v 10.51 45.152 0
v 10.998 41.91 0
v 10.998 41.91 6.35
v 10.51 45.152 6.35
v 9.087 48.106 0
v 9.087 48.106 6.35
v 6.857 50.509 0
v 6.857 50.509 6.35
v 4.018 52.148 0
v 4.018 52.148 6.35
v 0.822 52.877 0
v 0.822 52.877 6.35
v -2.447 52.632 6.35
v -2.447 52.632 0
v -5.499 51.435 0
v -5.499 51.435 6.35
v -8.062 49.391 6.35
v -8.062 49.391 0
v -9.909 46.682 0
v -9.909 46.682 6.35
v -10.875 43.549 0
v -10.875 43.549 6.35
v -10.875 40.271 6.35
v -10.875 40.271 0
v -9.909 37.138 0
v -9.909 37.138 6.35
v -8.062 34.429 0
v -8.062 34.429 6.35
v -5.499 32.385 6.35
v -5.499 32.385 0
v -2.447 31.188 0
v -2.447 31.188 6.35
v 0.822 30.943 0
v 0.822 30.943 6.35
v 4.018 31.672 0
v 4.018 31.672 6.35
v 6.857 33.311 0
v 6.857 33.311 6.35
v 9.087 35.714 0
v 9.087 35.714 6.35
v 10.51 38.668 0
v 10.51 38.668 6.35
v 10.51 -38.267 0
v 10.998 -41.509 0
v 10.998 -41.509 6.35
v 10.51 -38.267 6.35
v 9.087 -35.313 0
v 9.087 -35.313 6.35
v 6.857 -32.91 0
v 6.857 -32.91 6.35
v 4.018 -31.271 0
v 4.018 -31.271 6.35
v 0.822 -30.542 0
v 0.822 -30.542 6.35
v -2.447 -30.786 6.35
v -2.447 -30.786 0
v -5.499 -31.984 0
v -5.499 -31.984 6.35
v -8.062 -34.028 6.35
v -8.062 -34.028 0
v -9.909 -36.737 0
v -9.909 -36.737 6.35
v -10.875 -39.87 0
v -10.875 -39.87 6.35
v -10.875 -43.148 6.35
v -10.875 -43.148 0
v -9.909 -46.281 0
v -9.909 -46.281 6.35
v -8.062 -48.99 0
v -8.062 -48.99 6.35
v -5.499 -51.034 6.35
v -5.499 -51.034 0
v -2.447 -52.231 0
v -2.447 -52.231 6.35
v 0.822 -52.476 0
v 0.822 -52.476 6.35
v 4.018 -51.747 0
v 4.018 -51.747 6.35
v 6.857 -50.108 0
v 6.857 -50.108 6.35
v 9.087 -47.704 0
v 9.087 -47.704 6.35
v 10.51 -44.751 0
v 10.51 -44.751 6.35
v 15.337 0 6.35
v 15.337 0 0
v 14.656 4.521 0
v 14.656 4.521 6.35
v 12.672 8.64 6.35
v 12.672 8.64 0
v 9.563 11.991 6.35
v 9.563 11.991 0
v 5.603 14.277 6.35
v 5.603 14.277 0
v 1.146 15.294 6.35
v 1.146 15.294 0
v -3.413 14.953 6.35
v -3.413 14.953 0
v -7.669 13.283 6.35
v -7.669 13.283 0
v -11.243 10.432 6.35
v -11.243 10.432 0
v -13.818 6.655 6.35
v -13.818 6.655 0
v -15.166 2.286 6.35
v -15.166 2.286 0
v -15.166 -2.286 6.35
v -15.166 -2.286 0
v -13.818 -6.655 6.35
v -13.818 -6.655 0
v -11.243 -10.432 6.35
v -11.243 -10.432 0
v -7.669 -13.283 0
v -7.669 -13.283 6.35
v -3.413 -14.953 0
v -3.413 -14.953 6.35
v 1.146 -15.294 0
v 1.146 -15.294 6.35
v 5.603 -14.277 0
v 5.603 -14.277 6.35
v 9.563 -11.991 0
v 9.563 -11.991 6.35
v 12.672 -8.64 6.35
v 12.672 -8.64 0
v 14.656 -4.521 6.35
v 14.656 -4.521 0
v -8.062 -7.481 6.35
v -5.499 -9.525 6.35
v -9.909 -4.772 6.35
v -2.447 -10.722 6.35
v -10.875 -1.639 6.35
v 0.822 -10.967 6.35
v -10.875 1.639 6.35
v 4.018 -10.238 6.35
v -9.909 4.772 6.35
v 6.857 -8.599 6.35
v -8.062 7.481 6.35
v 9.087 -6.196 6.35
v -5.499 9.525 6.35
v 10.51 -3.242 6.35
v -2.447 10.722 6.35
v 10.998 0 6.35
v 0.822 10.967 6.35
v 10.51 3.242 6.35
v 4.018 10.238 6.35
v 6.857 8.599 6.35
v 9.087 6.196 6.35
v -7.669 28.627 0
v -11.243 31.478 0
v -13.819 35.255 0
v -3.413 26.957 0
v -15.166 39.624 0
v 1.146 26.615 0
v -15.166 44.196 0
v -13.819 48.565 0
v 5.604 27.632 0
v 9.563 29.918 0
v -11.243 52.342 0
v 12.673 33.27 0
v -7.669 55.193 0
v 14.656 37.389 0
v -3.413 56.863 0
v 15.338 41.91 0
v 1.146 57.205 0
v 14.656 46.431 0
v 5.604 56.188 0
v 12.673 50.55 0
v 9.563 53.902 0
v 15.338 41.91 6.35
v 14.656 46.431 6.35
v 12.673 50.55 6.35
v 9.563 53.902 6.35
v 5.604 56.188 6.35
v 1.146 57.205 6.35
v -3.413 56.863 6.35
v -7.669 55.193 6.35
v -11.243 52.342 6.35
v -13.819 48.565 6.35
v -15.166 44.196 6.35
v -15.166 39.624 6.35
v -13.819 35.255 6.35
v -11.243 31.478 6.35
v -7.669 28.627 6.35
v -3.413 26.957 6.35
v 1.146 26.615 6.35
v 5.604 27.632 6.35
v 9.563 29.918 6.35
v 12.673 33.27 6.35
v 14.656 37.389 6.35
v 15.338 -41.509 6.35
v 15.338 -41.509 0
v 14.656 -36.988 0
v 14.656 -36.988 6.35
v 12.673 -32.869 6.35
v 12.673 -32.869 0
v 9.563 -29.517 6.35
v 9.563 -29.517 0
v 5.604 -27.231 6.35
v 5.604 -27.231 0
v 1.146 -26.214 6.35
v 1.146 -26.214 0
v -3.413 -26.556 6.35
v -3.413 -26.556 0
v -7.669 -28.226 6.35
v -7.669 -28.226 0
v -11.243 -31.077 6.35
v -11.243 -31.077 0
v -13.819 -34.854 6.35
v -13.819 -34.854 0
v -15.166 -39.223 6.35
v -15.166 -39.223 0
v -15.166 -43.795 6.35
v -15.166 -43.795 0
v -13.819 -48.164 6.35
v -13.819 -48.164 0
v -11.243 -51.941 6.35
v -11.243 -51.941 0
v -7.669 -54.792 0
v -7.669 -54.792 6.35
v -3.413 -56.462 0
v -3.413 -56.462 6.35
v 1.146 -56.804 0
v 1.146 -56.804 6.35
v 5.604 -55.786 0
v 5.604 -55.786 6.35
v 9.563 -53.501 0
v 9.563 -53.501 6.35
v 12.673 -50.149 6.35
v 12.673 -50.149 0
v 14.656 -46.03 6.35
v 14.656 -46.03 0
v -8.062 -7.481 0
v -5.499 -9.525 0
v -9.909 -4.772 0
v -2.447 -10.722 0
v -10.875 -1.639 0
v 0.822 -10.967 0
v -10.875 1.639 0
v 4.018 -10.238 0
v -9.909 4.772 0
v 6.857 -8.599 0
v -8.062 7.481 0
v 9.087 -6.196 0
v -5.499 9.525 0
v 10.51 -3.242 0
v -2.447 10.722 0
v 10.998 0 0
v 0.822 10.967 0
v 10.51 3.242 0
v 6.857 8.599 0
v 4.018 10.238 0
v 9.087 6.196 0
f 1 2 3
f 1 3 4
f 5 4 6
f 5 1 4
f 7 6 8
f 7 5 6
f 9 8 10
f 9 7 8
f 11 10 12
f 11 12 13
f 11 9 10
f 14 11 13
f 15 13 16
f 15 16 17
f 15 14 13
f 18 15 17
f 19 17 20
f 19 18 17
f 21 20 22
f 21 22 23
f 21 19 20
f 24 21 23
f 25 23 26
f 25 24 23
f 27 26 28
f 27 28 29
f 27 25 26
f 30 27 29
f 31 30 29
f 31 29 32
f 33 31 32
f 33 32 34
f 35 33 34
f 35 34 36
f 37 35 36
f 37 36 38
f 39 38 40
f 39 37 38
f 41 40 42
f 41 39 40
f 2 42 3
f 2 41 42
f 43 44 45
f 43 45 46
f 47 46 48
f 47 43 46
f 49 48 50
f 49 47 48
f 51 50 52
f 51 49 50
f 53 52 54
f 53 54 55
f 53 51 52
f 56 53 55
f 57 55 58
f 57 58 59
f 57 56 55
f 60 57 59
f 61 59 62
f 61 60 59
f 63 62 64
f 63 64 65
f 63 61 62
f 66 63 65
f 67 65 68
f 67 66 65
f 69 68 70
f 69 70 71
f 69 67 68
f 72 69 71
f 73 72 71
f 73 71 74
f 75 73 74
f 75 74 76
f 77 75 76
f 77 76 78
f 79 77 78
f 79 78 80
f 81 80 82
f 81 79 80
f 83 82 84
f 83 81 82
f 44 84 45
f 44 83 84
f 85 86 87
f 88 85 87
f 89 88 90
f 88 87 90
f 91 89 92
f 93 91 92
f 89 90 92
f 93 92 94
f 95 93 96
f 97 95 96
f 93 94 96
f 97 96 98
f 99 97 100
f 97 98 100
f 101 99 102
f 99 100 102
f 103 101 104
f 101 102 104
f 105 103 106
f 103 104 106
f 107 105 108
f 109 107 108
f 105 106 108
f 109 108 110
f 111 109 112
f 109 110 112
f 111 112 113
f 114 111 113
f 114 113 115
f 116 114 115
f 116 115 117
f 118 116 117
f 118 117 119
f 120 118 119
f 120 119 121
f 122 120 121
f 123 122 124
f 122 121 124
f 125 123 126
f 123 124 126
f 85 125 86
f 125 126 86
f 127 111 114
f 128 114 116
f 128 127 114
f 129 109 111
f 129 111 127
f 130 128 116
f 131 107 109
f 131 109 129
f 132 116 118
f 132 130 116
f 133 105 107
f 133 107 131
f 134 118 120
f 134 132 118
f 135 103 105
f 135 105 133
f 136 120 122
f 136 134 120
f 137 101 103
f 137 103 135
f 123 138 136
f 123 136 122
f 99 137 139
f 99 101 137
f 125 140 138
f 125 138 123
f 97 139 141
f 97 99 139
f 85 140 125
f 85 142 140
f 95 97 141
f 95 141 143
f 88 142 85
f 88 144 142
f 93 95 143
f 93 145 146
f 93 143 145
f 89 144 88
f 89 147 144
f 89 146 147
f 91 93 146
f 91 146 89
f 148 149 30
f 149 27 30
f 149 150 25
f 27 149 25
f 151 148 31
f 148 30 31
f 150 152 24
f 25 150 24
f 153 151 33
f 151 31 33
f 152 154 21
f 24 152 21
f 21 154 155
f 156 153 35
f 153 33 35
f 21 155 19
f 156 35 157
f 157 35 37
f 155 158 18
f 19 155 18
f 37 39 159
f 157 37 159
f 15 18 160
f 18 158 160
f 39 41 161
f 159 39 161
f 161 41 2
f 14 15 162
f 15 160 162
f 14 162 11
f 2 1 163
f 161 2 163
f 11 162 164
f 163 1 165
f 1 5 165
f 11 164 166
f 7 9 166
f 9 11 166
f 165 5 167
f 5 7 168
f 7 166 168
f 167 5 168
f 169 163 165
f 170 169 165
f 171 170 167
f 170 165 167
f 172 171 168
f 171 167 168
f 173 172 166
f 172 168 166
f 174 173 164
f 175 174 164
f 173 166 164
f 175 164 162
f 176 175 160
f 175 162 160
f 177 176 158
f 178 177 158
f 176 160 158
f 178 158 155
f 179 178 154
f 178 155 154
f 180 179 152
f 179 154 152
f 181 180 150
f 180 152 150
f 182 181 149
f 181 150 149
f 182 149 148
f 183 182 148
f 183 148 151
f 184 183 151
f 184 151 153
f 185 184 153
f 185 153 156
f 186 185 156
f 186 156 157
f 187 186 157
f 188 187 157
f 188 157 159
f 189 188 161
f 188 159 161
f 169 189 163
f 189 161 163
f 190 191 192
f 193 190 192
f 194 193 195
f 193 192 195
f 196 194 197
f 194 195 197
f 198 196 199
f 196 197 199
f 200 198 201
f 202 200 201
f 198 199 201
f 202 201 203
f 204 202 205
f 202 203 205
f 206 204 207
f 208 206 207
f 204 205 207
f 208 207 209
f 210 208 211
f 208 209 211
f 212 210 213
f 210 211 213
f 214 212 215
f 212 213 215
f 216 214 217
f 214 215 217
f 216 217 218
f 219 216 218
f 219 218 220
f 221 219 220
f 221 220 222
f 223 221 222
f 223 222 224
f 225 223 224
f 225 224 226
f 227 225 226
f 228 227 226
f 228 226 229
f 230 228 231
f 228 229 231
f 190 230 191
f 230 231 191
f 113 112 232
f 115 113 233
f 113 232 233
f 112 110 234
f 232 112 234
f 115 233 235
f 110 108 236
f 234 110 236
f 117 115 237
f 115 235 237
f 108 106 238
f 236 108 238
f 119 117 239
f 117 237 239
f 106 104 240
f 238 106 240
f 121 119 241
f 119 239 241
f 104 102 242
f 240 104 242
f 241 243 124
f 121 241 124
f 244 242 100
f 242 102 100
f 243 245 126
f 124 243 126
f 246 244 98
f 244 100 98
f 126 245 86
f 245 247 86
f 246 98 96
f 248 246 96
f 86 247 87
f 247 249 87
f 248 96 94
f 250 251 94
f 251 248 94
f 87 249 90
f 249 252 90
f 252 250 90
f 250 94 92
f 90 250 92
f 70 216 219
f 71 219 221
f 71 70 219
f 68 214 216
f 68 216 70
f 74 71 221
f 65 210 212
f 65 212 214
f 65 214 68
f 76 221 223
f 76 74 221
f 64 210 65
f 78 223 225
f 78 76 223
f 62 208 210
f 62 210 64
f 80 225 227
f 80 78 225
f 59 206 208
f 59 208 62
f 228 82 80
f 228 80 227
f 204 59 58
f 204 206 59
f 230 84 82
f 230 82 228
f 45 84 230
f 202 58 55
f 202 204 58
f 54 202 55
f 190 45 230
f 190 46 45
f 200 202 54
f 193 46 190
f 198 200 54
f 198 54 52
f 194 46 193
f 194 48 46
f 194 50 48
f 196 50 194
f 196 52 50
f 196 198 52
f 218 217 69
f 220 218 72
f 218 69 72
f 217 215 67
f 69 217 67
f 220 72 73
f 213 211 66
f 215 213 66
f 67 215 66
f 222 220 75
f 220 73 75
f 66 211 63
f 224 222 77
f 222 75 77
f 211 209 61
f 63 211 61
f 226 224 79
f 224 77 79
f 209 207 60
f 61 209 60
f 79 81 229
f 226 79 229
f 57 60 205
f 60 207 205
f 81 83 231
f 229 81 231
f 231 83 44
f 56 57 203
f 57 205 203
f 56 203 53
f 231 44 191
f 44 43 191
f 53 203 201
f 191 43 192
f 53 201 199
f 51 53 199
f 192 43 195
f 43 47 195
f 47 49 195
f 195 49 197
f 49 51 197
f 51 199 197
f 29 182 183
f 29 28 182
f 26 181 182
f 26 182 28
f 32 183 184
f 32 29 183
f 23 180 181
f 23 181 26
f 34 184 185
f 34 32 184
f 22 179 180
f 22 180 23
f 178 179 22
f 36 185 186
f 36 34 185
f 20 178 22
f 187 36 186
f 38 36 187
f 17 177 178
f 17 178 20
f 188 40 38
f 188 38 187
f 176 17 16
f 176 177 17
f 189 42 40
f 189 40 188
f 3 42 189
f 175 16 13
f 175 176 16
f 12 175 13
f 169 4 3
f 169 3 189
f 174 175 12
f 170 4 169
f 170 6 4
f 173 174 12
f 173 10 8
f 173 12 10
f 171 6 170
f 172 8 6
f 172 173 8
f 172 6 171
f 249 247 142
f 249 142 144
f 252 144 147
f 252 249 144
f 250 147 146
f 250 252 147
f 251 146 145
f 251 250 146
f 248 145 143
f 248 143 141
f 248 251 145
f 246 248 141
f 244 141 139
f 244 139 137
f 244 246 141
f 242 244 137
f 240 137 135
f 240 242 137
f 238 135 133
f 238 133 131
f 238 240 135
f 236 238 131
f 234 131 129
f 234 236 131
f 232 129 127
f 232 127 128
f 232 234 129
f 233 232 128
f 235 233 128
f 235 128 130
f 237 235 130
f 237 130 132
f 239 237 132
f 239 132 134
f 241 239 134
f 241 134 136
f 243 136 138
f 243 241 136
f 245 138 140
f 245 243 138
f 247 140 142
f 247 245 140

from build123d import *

# Parameters (mm, degrees)
F1_R     = 15.337315
F1_R_2   = 10.9982
F2_R     = 15.33779
F2_R_2   = 10.9982
F3_DEPTH = 6.35


with BuildPart() as f3:
    # F1 (on face) + F2 (on Top) → F3 (new body)
    with BuildSketch(Plane.XY):
        Circle(F1_R)
        Circle(F1_R_2, mode=Mode.SUBTRACT)
    with BuildSketch(Plane.XY):
        with Locations((0, 41.910004)):
            Circle(F2_R)
        with Locations((0, 41.910004)):
            Circle(F2_R_2, mode=Mode.SUBTRACT)
        with Locations((0, -41.508947)):
            Circle(F2_R)
        with Locations((0, -41.508947)):
            Circle(F2_R_2, mode=Mode.SUBTRACT)
    extrude(amount=F3_DEPTH)


solid = f3.part
